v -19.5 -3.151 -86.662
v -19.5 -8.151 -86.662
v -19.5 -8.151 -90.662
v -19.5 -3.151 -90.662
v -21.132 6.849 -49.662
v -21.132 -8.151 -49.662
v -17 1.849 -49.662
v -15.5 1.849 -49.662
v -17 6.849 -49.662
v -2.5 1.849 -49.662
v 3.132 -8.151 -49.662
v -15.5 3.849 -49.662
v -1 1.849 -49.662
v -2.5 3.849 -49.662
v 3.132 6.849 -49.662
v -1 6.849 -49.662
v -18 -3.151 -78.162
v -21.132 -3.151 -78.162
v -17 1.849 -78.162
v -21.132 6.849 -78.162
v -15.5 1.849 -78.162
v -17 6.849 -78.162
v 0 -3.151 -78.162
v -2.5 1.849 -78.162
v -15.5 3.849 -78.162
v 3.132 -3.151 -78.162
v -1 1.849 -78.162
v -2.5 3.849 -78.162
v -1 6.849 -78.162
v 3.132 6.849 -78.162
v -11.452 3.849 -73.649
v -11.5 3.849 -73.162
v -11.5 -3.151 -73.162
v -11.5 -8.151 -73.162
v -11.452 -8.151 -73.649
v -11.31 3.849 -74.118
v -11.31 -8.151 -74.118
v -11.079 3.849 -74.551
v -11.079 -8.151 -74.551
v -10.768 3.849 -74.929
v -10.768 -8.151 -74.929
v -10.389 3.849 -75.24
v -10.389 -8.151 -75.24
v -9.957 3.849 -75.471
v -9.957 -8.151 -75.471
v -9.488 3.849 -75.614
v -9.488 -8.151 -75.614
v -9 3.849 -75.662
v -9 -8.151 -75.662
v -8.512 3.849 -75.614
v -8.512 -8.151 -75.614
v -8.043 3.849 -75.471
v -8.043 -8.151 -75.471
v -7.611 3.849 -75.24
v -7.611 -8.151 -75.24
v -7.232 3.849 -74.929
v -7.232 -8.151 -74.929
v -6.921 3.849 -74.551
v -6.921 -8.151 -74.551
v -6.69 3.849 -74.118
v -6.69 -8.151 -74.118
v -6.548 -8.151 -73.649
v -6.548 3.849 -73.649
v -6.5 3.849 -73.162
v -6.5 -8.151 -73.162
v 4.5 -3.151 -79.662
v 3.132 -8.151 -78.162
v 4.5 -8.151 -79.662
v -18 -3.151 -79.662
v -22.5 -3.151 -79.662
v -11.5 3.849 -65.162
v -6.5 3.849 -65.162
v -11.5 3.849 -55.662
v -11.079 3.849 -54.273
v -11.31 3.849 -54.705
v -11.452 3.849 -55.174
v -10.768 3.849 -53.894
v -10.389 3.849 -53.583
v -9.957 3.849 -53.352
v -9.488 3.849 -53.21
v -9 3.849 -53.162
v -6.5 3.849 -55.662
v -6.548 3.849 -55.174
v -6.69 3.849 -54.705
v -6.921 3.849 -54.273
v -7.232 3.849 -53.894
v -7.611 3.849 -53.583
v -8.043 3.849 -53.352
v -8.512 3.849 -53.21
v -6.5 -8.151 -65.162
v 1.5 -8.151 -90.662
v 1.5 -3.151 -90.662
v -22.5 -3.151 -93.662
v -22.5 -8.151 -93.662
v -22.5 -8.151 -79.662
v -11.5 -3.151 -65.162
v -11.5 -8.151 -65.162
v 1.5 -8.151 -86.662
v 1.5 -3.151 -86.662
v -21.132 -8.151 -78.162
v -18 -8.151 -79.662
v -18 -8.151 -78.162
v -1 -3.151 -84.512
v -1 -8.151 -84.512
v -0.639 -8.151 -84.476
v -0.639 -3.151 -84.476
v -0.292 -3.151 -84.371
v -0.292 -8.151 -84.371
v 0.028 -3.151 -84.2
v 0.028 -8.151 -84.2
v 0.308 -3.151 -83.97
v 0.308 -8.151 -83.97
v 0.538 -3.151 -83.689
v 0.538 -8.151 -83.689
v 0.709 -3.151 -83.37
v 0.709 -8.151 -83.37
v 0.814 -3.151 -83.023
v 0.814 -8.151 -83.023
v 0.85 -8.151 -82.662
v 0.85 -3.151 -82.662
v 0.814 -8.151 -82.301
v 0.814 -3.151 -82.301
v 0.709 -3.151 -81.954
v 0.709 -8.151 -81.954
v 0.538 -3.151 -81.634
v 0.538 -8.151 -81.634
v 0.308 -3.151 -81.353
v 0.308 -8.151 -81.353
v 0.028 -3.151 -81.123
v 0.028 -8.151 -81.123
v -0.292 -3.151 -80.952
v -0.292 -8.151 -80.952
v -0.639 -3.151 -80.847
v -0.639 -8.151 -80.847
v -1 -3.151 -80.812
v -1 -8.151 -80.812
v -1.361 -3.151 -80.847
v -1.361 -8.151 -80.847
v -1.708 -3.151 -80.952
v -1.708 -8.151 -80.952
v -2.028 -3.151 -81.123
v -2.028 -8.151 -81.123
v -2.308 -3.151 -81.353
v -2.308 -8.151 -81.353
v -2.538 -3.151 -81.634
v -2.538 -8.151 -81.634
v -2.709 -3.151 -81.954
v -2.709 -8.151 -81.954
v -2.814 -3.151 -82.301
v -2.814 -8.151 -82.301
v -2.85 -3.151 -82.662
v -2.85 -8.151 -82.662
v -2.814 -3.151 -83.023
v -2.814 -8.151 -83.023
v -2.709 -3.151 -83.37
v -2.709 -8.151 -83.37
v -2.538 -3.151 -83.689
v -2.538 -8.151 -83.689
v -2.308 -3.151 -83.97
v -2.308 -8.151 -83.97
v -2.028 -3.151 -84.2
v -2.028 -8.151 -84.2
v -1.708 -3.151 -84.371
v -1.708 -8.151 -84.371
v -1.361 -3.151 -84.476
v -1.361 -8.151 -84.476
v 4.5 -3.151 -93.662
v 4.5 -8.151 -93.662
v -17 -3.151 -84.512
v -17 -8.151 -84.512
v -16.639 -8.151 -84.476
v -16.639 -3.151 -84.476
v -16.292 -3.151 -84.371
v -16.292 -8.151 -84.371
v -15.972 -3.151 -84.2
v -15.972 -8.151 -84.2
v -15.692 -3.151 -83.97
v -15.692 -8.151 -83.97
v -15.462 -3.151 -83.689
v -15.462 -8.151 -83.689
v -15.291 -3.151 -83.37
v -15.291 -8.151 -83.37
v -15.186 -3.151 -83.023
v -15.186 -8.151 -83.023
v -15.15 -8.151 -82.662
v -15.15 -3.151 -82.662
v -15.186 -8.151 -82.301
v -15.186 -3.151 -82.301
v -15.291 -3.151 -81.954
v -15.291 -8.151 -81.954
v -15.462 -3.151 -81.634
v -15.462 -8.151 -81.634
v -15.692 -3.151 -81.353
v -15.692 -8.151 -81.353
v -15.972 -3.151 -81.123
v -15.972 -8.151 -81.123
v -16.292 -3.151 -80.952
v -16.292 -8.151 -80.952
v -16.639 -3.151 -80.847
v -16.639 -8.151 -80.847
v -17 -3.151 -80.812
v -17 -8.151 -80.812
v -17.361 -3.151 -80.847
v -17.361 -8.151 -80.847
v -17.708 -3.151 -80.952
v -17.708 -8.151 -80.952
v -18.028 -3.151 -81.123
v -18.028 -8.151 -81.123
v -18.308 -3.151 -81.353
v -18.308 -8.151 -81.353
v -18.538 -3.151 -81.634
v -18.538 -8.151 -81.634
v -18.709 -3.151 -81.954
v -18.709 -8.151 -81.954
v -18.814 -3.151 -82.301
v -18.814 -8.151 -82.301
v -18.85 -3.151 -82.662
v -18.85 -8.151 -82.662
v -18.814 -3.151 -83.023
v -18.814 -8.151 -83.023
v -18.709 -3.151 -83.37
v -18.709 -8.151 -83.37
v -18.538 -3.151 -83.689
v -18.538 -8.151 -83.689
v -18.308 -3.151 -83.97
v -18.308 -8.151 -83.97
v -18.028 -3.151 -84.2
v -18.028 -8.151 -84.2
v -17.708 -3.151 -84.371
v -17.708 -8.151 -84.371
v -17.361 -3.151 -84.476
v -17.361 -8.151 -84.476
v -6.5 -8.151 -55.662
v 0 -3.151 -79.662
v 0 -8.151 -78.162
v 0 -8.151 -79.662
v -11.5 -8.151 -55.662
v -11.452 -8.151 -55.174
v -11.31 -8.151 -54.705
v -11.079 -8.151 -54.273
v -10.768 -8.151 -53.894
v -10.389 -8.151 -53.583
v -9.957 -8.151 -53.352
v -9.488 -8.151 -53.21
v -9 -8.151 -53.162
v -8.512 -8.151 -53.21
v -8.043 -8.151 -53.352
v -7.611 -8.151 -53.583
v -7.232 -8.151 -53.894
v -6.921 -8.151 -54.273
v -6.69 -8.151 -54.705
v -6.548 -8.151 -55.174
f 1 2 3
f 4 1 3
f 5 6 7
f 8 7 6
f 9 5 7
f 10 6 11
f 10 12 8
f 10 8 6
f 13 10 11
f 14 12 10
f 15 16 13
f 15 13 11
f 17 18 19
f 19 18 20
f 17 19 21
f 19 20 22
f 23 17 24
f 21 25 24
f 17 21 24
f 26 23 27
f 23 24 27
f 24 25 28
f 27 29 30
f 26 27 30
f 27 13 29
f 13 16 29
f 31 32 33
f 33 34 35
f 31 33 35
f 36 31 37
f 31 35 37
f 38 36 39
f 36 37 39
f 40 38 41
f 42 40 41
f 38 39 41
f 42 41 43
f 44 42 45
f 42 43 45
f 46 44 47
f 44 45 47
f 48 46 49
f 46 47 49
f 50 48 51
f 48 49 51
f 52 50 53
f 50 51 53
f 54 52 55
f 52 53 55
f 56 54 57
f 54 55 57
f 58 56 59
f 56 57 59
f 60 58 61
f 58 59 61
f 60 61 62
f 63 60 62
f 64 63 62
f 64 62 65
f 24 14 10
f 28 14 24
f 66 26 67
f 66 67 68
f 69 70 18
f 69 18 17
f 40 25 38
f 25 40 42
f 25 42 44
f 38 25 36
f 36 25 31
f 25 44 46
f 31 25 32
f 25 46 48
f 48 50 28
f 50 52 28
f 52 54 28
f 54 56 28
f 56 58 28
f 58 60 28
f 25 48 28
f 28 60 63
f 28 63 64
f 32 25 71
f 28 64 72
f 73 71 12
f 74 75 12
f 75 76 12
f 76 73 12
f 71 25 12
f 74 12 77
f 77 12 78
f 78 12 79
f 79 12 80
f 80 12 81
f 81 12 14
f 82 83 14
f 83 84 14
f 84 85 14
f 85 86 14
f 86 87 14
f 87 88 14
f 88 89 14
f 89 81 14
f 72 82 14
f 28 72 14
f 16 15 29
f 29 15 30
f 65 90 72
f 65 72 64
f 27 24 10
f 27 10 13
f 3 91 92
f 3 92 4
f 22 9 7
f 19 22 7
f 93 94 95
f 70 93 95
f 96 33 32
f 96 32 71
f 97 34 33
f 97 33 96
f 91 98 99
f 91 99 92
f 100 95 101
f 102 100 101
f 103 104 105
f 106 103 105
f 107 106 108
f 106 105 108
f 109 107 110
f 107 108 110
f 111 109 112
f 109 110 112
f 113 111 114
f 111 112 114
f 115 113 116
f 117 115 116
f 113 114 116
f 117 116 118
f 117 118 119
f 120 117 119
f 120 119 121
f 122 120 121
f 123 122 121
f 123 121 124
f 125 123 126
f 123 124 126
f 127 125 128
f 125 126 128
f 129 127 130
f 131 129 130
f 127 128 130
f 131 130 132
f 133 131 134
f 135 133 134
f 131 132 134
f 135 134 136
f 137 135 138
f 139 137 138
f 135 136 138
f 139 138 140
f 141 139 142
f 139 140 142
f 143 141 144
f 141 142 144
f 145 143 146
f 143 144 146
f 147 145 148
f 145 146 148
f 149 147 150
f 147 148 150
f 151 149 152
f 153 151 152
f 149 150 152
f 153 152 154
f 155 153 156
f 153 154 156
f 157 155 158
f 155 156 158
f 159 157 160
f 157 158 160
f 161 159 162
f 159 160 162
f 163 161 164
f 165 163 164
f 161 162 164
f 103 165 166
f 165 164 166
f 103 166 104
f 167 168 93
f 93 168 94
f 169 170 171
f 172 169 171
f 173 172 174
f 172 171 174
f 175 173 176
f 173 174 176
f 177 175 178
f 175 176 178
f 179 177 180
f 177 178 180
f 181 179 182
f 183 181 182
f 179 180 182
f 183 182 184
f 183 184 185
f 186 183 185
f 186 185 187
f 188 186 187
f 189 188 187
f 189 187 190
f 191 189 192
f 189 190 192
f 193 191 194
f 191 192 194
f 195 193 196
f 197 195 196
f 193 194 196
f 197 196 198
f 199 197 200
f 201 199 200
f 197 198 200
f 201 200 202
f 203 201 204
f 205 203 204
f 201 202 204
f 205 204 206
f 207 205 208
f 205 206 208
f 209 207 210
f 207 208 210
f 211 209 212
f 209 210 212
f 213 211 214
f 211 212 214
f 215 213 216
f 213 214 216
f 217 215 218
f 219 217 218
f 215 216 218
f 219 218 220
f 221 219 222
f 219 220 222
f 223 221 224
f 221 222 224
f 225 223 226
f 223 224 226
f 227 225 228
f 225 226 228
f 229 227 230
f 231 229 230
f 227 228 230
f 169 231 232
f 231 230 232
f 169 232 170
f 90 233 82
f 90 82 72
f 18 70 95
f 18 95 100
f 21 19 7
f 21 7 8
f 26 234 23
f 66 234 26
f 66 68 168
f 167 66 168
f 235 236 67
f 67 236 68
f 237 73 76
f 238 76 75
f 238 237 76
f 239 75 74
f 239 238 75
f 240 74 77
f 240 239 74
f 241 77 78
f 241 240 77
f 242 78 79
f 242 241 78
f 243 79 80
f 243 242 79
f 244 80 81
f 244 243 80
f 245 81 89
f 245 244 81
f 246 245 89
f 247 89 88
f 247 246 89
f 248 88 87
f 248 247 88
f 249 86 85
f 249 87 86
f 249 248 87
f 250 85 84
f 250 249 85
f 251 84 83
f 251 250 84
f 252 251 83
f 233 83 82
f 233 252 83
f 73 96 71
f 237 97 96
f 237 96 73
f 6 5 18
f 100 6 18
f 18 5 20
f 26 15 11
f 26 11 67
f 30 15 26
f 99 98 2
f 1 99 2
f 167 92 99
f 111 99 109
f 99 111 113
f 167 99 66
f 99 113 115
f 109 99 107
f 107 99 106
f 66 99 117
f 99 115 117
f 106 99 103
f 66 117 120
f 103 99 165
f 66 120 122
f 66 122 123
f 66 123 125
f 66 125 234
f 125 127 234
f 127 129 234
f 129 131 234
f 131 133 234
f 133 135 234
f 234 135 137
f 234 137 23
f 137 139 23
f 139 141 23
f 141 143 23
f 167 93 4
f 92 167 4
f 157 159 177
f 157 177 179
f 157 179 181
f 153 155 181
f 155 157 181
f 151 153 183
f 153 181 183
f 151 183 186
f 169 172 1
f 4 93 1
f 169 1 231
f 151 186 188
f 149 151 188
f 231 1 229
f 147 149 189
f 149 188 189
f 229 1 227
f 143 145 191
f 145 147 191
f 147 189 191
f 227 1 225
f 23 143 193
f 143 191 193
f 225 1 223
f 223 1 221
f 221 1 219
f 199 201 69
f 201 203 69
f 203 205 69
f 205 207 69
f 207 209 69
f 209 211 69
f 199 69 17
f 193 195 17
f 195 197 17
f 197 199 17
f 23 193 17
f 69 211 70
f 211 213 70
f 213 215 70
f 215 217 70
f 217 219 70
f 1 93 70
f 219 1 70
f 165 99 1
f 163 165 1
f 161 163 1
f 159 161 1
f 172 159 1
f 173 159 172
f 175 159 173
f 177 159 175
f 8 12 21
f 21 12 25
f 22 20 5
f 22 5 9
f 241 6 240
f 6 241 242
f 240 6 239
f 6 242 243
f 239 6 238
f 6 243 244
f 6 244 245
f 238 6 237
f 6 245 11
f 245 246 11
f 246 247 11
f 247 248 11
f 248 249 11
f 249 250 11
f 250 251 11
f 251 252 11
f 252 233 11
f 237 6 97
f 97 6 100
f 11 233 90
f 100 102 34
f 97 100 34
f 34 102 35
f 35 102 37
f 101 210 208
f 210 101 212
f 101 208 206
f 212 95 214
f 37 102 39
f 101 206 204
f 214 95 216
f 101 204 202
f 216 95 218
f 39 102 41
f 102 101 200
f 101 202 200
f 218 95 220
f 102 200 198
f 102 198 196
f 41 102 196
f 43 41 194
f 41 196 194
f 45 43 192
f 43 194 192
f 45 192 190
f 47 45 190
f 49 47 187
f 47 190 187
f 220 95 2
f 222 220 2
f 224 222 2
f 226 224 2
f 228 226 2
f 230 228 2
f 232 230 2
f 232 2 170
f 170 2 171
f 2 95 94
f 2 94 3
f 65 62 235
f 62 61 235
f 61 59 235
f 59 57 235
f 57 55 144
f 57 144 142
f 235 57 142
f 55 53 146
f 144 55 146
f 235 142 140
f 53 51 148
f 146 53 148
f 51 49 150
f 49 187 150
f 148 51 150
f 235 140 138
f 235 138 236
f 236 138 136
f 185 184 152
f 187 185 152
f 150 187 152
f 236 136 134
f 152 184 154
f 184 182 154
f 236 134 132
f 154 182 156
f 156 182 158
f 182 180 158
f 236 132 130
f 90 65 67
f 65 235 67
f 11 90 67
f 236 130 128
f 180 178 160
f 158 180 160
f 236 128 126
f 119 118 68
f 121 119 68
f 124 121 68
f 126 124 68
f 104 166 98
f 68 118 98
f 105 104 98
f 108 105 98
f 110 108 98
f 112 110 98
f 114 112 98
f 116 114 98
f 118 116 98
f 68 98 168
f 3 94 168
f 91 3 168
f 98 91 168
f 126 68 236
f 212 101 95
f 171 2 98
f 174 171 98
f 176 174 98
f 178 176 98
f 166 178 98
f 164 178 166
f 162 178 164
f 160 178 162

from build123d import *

# Parameters (mm, degrees)
CROQUIS1_W                    = 30
CROQUIS1_H                    = 10
SALIENTE_EXTRUIR1_DEPTH       = 18
CROQUIS2_W                    = 16
CROQUIS2_H                    = 3
CORTAR_EXTRUIR1_DEPTH         = 39.831471343
DI_METRO_DE_TALADRO_5_0_5_1_D = 5
DI_METRO_DE_TALADRO_5_0_5_2_D = 5
SALIENTE_EXTRUIR2_START       = 5
CROQUIS7_W                    = 18
CROQUIS7_H                    = 30
CROQUIS7_R                    = 2.5
CROQUIS7_R_2                  = 1.85
SALIENTE_EXTRUIR2_DEPTH       = 5
CORTAR_EXTRUIR3_REACH         = 99.487
CROQUIS9_W                    = 21
CROQUIS9_H                    = 4
CORTAR_EXTRUIR4_REACH         = 98.671
CROQUIS12_W                   = 1.5
CROQUIS12_H                   = 10
CROQUIS11_W                   = 3.131833875
CROQUIS11_H                   = 28.5
SALIENTE_EXTRUIR4_DEPTH       = 15
CROQUIS13_W                   = 1.5
CROQUIS13_H                   = 28.5
CORTAR_EXTRUIR5_DEPTH         = 2
CORTAR_EXTRUIR6_START         = -12
CORTAR_EXTRUIR6_DEPTH         = 15
SALIENTE_EXTRUIR5_DEPTH       = 5


with BuildPart() as part:
    # Croquis1 → Saliente-Extruir1 (new body)
    with BuildSketch(Plane(origin=(0, 0, 0), x_dir=(0, 0, -1), z_dir=(1, 0, 0))):
        with Locations((64.661633078, 1.848832797)):
            Rectangle(CROQUIS1_W, CROQUIS1_H)
    extrude(amount=-SALIENTE_EXTRUIR1_DEPTH)

    # Croquis2 → Cortar-Extruir1 (cut, through all)
    with BuildSketch(Plane(origin=(0, 13.697665595, -49.661633078), x_dir=(1, 0, 0), z_dir=(0, 0, -1))):
        with Locations((-9, 8.348832797)):
            Rectangle(CROQUIS2_W, CROQUIS2_H)
    extrude(amount=CORTAR_EXTRUIR1_DEPTH, mode=Mode.SUBTRACT)

    # Diámetro de taladro Ø5.0 (5)1 (through all)
    with Locations(Plane(origin=(0, 3.848832797, 0), x_dir=(1, 0, 0), z_dir=(0, 1, 0))):
        with Locations((-9, 65.161633078)):
            Hole(DI_METRO_DE_TALADRO_5_0_5_1_D / 2)

    # Diámetro de taladro Ø5.0 (5)2 (through all)
    with Locations(Plane(origin=(0, 3.848832797, 0), x_dir=(1, 0, 0), z_dir=(0, 1, 0))):
        with Locations((-9, 73.161633078)):
            Hole(DI_METRO_DE_TALADRO_5_0_5_2_D / 2)

    # Croquis7 → Saliente-Extruir2 (add)
    # profile 1 of 2: a face of its own
    with BuildSketch(Plane.XZ.offset(3.151167203).offset(SALIENTE_EXTRUIR2_START)):
        with Locations((-9, -64.661633078)):
            Rectangle(CROQUIS7_W, CROQUIS7_H)
        with Locations(Location((-9, -65.161633078, 0), (0, 0, 90))):
            Circle(CROQUIS7_R, mode=Mode.SUBTRACT)
        with Locations(Location((-9, -73.161633078, 0), (0, 0, 90))):
            Circle(CROQUIS7_R, mode=Mode.SUBTRACT)
    # profile 2 of 2: a face of its own
    with BuildSketch(Plane.XZ.offset(3.151167203).offset(SALIENTE_EXTRUIR2_START)):
        Polygon((0, -79.661633078), (4.5, -79.661633078), (4.5, -93.661633078), (-22.5, -93.661633078), (-22.5, -79.661633078), (-18, -79.661633078), align=None)
        with Locations(Location((-17, -82.661633078, 0), (0, 0, 270))):
            Circle(CROQUIS7_R_2, mode=Mode.SUBTRACT)
        with Locations(Location((-1, -82.661633078, 0), (0, 0, 270))):
            Circle(CROQUIS7_R_2, mode=Mode.SUBTRACT)
    extrude(amount=-SALIENTE_EXTRUIR2_DEPTH)

    # Croquis9 → Cortar-Extruir3 (cut, up to next)
    with BuildSketch(Plane(origin=(0, -8.151167203, 0), x_dir=(-1, 0, 0), z_dir=(0, -1, 0)), mode=Mode.PRIVATE) as cortar_extruir3_sk1:
        with Locations((9, 88.661633078)):
            Rectangle(CROQUIS9_W, CROQUIS9_H)
    cortar_extruir3_tool1 = extrude(cortar_extruir3_sk1.sketch, amount=-CORTAR_EXTRUIR3_REACH, mode=Mode.PRIVATE) & part.part
    add(cortar_extruir3_tool1.solids().sort_by_distance((-9, -8.151167, -88.661633))[0], mode=Mode.SUBTRACT)

    # Croquis12 → Cortar-Extruir4 (cut, up to next)
    with BuildSketch(Plane.ZY.offset(18), mode=Mode.PRIVATE) as cortar_extruir4_sk1:
        with Locations((-78.911633078, 1.848832797)):
            Rectangle(CROQUIS12_W, CROQUIS12_H)
    cortar_extruir4_tool1 = extrude(cortar_extruir4_sk1.sketch, amount=-CORTAR_EXTRUIR4_REACH, mode=Mode.PRIVATE) & part.part
    add(cortar_extruir4_tool1.solids().sort_by_distance((-18, 1.848833, -78.911633))[0], mode=Mode.SUBTRACT)

    # Croquis11 → Saliente-Extruir4 (add)
    with BuildSketch(Plane(origin=(0, 6.848832797, 0), x_dir=(1, 0, 0), z_dir=(0, 1, 0))):
        with Locations((-19.565916937, 63.911633078)):
            Rectangle(CROQUIS11_W, CROQUIS11_H)
        with Locations((1.565916938, 63.911633078)):
            Rectangle(CROQUIS11_W, CROQUIS11_H)
    extrude(amount=-SALIENTE_EXTRUIR4_DEPTH)

    # Croquis13 → Cortar-Extruir5 (cut)
    with BuildSketch(Plane(origin=(0, 3.848832797, 0), x_dir=(1, 0, 0), z_dir=(0, 1, 0))):
        with Locations((-16.25, 63.911633078)):
            Rectangle(CROQUIS13_W, CROQUIS13_H)
        with Locations((-1.75, 63.911633078)):
            Rectangle(CROQUIS13_W, CROQUIS13_H)
    extrude(amount=-CORTAR_EXTRUIR5_DEPTH, mode=Mode.SUBTRACT)

    # Croquis14 → Cortar-Extruir6 (cut)
    with BuildSketch(Plane(origin=(0, 3.848832797, 0), x_dir=(1, 0, 0), z_dir=(0, 1, 0)).offset(CORTAR_EXTRUIR6_START)):
        with BuildLine():
            Line((-6.5, 55.661633078), (-6.5, 73.161633078))
            ThreePointArc((-6.5, 73.161633078), (-9, 75.661633078), (-11.5, 73.161633078))
            Line((-11.5, 73.161633078), (-11.5, 55.661633078))
            ThreePointArc((-11.5, 55.661633078), (-9, 53.161633078), (-6.5, 55.661633078))
        make_face()
    extrude(amount=CORTAR_EXTRUIR6_DEPTH, mode=Mode.SUBTRACT)

    # Croquis15 → Saliente-Extruir5 (add)
    with BuildSketch(Plane(origin=(0, -3.151167203, 0), x_dir=(1, 0, 0), z_dir=(0, 1, 0))):
        Polygon((-18, 78.161633078), (-18, 79.661633078), (-22.5, 79.661633078), (-21.131833875, 78.161633078), align=None)
        Polygon((0, 78.161633078), (3.131833875, 78.161633078), (4.5, 79.661633078), (0, 79.661633078), align=None)
    extrude(amount=-SALIENTE_EXTRUIR5_DEPTH)


solid = part.part
